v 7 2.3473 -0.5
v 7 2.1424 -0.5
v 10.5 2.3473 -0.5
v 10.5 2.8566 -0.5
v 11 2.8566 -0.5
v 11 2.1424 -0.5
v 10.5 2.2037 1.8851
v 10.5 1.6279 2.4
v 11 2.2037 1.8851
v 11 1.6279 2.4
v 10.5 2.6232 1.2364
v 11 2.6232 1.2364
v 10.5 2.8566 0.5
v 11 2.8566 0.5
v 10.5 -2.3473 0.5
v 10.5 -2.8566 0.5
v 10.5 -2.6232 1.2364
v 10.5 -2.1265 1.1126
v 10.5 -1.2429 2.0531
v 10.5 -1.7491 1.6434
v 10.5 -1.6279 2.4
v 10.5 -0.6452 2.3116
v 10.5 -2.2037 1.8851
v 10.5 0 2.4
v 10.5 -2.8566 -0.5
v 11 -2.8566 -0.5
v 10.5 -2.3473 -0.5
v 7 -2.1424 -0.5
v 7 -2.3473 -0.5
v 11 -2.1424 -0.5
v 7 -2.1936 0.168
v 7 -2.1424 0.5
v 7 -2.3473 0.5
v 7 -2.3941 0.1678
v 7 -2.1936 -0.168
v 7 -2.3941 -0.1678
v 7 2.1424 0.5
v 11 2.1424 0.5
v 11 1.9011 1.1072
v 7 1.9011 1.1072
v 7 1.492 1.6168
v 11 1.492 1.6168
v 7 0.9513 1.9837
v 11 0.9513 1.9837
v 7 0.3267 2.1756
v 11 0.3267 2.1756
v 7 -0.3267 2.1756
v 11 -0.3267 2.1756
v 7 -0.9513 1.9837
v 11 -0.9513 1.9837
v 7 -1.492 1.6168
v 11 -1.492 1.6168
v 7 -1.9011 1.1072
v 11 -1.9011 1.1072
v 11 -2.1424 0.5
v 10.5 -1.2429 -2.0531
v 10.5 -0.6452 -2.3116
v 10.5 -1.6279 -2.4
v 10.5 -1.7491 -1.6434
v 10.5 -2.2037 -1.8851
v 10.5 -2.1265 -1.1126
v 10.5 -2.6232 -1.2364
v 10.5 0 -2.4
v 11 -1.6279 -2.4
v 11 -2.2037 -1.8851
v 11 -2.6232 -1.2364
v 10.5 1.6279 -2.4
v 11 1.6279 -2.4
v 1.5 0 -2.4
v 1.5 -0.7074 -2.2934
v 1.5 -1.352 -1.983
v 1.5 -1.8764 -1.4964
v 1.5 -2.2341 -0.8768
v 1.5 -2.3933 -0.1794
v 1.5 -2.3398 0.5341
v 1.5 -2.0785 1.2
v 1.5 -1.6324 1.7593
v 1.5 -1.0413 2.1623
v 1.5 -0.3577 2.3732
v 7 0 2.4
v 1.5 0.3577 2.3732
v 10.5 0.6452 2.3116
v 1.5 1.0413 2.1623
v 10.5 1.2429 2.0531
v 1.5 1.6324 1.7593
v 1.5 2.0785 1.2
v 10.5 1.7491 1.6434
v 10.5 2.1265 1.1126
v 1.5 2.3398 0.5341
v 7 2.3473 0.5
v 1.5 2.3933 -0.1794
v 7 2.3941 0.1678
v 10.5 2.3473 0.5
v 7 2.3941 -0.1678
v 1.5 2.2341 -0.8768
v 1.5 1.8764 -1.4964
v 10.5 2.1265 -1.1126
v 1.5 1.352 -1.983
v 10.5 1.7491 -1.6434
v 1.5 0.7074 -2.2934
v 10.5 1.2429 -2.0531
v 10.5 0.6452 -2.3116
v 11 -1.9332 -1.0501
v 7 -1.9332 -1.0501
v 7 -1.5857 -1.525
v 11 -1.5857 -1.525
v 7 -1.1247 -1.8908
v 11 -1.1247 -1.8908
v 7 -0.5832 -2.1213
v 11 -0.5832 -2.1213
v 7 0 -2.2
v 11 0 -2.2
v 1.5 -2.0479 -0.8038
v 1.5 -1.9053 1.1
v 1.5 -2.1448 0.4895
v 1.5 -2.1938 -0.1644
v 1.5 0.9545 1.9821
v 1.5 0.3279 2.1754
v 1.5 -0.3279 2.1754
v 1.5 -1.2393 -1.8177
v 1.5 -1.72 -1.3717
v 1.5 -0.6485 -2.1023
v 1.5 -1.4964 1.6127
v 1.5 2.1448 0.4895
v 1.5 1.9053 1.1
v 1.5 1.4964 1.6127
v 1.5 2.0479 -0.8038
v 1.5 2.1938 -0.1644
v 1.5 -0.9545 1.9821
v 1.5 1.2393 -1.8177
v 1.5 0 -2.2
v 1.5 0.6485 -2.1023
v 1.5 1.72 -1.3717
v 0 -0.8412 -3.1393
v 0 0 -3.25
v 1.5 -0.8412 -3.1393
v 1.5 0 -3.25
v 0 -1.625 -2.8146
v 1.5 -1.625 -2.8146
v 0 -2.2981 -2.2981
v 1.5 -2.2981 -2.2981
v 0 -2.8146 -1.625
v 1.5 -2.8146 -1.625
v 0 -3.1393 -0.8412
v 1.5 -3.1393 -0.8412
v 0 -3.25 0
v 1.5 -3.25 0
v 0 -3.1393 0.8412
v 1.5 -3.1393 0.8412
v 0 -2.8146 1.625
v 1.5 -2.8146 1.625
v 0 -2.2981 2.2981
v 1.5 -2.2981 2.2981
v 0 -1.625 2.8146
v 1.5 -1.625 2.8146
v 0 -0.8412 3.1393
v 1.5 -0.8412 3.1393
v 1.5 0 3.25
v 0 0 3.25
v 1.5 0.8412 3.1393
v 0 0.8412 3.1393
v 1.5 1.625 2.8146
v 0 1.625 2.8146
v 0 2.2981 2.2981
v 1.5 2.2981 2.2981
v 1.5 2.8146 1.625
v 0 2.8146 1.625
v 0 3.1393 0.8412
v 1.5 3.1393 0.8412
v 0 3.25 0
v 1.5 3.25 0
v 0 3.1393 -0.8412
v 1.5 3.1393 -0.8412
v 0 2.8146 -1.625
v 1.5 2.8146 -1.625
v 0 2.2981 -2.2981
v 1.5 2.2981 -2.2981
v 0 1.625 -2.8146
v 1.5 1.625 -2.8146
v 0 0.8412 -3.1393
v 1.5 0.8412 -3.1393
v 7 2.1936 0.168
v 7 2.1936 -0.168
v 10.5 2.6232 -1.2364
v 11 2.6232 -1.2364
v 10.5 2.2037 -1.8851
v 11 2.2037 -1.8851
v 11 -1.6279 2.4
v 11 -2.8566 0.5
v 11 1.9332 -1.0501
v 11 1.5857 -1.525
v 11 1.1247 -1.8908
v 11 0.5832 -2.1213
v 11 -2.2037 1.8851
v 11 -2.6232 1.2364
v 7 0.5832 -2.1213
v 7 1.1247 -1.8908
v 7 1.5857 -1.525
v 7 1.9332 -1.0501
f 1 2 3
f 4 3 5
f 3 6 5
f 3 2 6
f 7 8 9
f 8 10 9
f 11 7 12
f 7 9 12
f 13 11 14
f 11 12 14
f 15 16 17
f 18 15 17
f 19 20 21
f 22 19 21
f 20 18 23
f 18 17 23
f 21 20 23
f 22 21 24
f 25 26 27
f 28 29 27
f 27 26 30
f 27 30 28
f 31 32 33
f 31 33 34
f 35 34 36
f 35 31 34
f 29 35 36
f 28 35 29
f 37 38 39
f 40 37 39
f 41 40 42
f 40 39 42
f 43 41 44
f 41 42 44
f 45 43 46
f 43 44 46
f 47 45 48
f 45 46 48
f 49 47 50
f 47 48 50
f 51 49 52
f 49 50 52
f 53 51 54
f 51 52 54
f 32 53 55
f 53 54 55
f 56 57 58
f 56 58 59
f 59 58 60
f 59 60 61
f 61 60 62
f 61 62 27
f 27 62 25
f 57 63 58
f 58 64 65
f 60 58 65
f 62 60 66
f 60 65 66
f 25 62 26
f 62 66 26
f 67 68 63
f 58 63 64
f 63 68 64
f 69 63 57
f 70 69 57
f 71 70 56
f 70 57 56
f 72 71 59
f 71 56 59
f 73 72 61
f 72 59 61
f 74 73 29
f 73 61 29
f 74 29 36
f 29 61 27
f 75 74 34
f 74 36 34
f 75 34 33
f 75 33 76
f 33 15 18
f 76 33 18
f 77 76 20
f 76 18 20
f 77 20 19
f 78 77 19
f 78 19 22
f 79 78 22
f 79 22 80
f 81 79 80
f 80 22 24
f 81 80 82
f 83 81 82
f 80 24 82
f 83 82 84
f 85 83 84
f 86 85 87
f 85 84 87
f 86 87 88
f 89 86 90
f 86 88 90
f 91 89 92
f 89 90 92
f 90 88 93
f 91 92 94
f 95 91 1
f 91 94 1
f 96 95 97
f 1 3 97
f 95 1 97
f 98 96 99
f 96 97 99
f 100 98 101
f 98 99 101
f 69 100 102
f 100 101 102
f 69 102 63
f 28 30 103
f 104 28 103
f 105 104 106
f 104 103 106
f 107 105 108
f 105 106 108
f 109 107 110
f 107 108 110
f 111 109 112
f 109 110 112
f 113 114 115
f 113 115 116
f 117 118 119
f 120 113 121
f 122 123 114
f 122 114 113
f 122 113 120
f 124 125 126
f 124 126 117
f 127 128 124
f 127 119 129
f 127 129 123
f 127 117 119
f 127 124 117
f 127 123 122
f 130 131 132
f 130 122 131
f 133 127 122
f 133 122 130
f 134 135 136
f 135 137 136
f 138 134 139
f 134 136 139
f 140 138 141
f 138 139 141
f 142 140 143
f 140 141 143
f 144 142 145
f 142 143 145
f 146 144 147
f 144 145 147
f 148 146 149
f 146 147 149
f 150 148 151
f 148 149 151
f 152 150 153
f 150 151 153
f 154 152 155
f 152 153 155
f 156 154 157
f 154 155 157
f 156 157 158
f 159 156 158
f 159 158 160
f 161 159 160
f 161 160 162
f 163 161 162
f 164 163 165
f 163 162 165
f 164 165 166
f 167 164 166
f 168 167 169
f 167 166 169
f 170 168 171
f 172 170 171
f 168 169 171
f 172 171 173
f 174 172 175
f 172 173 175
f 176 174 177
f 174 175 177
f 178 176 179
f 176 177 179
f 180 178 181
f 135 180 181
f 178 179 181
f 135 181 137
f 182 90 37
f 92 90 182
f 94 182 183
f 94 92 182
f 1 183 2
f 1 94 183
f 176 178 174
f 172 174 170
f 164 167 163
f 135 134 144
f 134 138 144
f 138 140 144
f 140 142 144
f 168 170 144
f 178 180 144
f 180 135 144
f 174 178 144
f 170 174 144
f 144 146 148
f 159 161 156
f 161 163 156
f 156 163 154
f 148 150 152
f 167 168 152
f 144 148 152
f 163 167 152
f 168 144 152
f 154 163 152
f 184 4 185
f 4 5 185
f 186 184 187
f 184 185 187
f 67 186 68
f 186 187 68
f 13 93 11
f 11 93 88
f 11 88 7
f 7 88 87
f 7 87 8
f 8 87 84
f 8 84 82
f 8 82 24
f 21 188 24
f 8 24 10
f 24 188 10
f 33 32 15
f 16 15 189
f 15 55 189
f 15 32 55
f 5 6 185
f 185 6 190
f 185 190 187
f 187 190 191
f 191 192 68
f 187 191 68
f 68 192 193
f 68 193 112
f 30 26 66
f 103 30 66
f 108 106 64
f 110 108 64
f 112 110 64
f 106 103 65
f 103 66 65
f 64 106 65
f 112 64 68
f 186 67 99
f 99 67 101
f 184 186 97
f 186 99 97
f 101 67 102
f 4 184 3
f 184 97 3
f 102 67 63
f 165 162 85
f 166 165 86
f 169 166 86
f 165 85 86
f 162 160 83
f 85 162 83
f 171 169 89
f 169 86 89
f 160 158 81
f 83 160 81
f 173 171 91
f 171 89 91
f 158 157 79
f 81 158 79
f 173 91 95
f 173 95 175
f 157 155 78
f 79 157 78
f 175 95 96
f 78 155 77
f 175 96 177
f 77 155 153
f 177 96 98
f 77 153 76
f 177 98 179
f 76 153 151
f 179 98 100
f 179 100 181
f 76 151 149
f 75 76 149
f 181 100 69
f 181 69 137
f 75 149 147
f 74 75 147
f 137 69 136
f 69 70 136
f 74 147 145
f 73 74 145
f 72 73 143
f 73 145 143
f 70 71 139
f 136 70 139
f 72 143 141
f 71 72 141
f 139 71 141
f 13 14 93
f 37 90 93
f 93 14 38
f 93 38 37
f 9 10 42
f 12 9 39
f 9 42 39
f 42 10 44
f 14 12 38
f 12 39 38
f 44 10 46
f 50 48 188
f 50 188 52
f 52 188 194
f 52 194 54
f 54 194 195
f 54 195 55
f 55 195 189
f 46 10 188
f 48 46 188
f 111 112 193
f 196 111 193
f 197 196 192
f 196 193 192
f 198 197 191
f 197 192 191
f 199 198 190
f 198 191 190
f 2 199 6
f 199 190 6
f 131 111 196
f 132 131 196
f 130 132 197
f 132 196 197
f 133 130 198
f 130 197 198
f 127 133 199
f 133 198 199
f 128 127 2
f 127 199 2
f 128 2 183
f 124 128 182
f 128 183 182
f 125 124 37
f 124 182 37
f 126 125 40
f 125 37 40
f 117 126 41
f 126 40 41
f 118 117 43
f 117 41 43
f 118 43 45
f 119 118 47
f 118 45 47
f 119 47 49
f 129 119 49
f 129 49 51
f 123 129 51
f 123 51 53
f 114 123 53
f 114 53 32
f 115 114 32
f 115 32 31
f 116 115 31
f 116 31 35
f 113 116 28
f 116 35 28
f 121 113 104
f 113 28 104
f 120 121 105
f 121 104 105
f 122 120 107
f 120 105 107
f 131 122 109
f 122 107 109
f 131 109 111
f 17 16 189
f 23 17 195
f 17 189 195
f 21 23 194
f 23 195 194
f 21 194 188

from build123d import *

# Parameters (mm, degrees)
CUT_EXTRUDE6_DEPTH = 4
SKETCH5_R          = 2.2
CUT_EXTRUDE7_DEPTH = 5.5


with BuildPart() as part:
    # Sketch3 → Revolve5 (revolve)
    with BuildSketch(Plane.XY, mode=Mode.PRIVATE) as revolve5_sk:
        Polygon((0, 0), (0, 3.25), (1.5, 3.25), (1.5, 2.4), (10.5, 2.4), (10.5, 2.9), (11, 2.9), (11, 0), align=None)
    revolve(revolve5_sk.sketch.rotate(Axis((11, 0, 0), (-1, 0, 0)), 90), axis=Axis((11, 0, 0), (-1, 0, 0)))

    # Sketch4 → Cut-Extrude6 (cut)
    with BuildSketch(Plane(origin=(11, 0, 0), x_dir=(0, 0, -1), z_dir=(1, 0, 0))):
        with BuildLine():
            ThreePointArc((-0.5, -2.856571371), (-0.250941252, -2.889122443), (-3e-09, -2.9))
            ThreePointArc((-3e-09, -2.9), (0.25094125, -2.889122443), (0.5, -2.856571371))
            Line((0.5, -2.856571371), (0.5, -2.142428529))
            ThreePointArc((0.5, -2.142428529), (0, -2.2), (-0.5, -2.142428529))
            Line((-0.5, -2.142428529), (-0.5, -2.856571371))
        make_face()
        with BuildLine():
            Line((-0.5, 2.856571371), (-0.5, 2.142428529))
            ThreePointArc((-0.5, 2.142428529), (0, 2.2), (0.5, 2.142428529))
            Line((0.5, 2.142428529), (0.5, 2.856571371))
            ThreePointArc((0.5, 2.856571371), (0.250941244, 2.889122443), (-1.4e-08, 2.9))
            ThreePointArc((-1.4e-08, 2.9), (-0.250941258, 2.889122442), (-0.5, 2.856571371))
        make_face()
        with BuildLine():
            Line((-0.5, 2.142428529), (-0.5, -2.142428529))
            ThreePointArc((-0.5, -2.142428529), (0, -2.2), (0.5, -2.142428529))
            Line((0.5, -2.142428529), (0.5, 2.142428529))
            ThreePointArc((0.5, 2.142428529), (0, 2.2), (-0.5, 2.142428529))
        make_face()
        with BuildLine():
            ThreePointArc((-0.5, 2.142428529), (-2.2, 0), (-0.5, -2.142428529))
            Line((-0.5, -2.142428529), (-0.5, 2.142428529))
        make_face()
        with BuildLine():
            Line((0.5, 2.142428529), (0.5, -2.142428529))
            ThreePointArc((0.5, -2.142428529), (1.723368794, -1.367479433), (2.2, 0))
            ThreePointArc((2.2, 0), (1.723368794, 1.367479433), (0.5, 2.142428529))
        make_face()
        with BuildLine():
            Line((2.4, 1.62788206), (2.4, -1.62788206))
            ThreePointArc((2.4, -1.62788206), (2.772183255, -0.851469318), (2.9, 0))
            ThreePointArc((2.9, 0), (2.772183255, 0.851469318), (2.4, 1.62788206))
        make_face()
        with BuildLine():
            ThreePointArc((-2.9, -6e-09), (-2.772183254, -0.851469321), (-2.4, -1.62788206))
            Line((-2.4, -1.62788206), (-2.4, 1.62788206))
            ThreePointArc((-2.4, 1.62788206), (-2.772183256, 0.851469315), (-2.9, -6e-09))
        make_face()
    extrude(amount=-CUT_EXTRUDE6_DEPTH, mode=Mode.SUBTRACT)

    # Sketch5 → Cut-Extrude7 (cut)
    with BuildSketch(Plane(origin=(7, 0, 0), x_dir=(0, 0, -1), z_dir=(1, 0, 0))):
        Circle(SKETCH5_R)
    extrude(amount=-CUT_EXTRUDE7_DEPTH, mode=Mode.SUBTRACT)


solid = part.part
